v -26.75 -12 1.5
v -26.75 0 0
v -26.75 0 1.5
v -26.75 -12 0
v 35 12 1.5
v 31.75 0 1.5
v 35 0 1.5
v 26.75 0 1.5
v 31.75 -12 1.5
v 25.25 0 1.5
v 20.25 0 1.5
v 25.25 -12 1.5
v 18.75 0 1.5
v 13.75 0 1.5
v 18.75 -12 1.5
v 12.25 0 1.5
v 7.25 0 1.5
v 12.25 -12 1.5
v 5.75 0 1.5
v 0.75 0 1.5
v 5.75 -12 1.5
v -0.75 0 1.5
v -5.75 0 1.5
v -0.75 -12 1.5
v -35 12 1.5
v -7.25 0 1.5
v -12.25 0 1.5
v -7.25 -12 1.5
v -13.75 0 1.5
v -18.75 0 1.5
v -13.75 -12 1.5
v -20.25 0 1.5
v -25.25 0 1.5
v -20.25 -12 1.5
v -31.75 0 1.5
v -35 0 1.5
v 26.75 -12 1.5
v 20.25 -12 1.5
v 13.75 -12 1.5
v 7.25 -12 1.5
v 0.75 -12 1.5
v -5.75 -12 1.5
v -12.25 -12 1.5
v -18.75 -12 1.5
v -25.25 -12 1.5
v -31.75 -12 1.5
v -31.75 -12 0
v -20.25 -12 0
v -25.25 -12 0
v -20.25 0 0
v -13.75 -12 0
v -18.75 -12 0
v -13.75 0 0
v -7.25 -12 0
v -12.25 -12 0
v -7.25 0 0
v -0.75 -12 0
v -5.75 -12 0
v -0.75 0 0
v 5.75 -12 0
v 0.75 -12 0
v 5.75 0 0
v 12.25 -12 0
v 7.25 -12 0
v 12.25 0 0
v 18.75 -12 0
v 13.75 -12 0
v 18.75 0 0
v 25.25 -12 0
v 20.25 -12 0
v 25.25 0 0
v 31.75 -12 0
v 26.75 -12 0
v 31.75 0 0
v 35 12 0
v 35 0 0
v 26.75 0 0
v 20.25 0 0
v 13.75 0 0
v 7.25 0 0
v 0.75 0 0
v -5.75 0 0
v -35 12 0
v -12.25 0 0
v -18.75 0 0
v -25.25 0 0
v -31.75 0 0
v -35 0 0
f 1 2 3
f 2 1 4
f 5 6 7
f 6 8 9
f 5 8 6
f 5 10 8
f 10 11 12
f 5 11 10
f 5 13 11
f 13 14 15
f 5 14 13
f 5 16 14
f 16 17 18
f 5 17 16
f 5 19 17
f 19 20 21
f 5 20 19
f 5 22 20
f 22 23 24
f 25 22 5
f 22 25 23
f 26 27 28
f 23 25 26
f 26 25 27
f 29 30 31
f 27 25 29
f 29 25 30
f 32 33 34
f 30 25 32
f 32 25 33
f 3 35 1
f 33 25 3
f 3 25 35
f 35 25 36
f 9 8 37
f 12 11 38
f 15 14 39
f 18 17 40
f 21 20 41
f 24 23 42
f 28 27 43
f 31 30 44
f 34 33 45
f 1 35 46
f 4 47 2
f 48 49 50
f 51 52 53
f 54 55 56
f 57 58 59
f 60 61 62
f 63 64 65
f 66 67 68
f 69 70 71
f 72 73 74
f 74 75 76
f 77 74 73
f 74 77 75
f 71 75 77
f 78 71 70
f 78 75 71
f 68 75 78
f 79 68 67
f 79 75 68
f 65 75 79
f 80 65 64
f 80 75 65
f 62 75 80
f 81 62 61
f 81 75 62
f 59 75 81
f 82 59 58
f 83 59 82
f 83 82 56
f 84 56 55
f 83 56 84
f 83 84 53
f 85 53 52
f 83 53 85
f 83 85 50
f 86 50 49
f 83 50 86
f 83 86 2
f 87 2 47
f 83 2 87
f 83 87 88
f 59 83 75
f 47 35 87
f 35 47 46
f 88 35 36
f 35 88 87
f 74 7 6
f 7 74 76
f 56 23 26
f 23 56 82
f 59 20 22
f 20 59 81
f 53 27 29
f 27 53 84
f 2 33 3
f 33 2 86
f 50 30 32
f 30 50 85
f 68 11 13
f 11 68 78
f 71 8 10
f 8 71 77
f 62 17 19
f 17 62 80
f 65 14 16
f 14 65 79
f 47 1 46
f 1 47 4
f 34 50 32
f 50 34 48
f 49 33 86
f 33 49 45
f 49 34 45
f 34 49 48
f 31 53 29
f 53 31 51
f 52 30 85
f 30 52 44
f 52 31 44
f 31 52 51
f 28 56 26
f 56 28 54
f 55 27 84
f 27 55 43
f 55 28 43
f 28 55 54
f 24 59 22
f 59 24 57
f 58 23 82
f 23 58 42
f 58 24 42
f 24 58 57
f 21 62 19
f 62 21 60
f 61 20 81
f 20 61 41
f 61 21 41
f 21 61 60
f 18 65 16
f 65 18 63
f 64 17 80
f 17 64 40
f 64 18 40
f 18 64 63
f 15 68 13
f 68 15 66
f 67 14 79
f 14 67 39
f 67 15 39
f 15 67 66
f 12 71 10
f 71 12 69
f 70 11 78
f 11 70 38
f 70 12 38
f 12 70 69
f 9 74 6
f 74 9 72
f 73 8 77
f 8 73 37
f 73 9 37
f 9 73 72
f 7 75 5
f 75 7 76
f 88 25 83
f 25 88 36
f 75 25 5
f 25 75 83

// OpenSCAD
// Named variables at the top
spine_x = 70;       // Spine length in X (mm)
spine_y = 12;       // Spine width in Y (mm)
spine_z = 1.5;      // Plate thickness in Z (mm)
tooth_x = 5.0;      // Tooth width in X (mm)
tooth_y = 12;       // Tooth length in Y (mm)
gap_x = 1.5;        // Gap between neighbouring teeth in X (mm)
num_teeth = 10;     // Number of teeth

// Derived layout calculations
spine_x_half = spine_x / 2;
total_tooth_width = num_teeth * tooth_x + (num_teeth - 1) * gap_x;
margin_x = (spine_x - total_tooth_width) / 2;
tooth_start_x = -spine_x_half + margin_x;
tooth_pitch = tooth_x + gap_x;

$fn = 64;

// Print orientation: rests on XY plane at z=0, builds upward in +Z
// Spine: X [-35, 35], Y [0, 12]
// Teeth: hang from Y=0 edge in -Y direction, Y [-12, 0]
union() {
    // Spine (back bar)
    translate([-spine_x_half, 0, 0]) {
        cube([spine_x, spine_y, spine_z]);
    }

    // Teeth row
    for (i = [0 : num_teeth - 1]) {
        tx = tooth_start_x + i * tooth_pitch;
        translate([tx, -tooth_y, 0]) {
            cube([tooth_x, tooth_y, spine_z]);
        }
    }
}
